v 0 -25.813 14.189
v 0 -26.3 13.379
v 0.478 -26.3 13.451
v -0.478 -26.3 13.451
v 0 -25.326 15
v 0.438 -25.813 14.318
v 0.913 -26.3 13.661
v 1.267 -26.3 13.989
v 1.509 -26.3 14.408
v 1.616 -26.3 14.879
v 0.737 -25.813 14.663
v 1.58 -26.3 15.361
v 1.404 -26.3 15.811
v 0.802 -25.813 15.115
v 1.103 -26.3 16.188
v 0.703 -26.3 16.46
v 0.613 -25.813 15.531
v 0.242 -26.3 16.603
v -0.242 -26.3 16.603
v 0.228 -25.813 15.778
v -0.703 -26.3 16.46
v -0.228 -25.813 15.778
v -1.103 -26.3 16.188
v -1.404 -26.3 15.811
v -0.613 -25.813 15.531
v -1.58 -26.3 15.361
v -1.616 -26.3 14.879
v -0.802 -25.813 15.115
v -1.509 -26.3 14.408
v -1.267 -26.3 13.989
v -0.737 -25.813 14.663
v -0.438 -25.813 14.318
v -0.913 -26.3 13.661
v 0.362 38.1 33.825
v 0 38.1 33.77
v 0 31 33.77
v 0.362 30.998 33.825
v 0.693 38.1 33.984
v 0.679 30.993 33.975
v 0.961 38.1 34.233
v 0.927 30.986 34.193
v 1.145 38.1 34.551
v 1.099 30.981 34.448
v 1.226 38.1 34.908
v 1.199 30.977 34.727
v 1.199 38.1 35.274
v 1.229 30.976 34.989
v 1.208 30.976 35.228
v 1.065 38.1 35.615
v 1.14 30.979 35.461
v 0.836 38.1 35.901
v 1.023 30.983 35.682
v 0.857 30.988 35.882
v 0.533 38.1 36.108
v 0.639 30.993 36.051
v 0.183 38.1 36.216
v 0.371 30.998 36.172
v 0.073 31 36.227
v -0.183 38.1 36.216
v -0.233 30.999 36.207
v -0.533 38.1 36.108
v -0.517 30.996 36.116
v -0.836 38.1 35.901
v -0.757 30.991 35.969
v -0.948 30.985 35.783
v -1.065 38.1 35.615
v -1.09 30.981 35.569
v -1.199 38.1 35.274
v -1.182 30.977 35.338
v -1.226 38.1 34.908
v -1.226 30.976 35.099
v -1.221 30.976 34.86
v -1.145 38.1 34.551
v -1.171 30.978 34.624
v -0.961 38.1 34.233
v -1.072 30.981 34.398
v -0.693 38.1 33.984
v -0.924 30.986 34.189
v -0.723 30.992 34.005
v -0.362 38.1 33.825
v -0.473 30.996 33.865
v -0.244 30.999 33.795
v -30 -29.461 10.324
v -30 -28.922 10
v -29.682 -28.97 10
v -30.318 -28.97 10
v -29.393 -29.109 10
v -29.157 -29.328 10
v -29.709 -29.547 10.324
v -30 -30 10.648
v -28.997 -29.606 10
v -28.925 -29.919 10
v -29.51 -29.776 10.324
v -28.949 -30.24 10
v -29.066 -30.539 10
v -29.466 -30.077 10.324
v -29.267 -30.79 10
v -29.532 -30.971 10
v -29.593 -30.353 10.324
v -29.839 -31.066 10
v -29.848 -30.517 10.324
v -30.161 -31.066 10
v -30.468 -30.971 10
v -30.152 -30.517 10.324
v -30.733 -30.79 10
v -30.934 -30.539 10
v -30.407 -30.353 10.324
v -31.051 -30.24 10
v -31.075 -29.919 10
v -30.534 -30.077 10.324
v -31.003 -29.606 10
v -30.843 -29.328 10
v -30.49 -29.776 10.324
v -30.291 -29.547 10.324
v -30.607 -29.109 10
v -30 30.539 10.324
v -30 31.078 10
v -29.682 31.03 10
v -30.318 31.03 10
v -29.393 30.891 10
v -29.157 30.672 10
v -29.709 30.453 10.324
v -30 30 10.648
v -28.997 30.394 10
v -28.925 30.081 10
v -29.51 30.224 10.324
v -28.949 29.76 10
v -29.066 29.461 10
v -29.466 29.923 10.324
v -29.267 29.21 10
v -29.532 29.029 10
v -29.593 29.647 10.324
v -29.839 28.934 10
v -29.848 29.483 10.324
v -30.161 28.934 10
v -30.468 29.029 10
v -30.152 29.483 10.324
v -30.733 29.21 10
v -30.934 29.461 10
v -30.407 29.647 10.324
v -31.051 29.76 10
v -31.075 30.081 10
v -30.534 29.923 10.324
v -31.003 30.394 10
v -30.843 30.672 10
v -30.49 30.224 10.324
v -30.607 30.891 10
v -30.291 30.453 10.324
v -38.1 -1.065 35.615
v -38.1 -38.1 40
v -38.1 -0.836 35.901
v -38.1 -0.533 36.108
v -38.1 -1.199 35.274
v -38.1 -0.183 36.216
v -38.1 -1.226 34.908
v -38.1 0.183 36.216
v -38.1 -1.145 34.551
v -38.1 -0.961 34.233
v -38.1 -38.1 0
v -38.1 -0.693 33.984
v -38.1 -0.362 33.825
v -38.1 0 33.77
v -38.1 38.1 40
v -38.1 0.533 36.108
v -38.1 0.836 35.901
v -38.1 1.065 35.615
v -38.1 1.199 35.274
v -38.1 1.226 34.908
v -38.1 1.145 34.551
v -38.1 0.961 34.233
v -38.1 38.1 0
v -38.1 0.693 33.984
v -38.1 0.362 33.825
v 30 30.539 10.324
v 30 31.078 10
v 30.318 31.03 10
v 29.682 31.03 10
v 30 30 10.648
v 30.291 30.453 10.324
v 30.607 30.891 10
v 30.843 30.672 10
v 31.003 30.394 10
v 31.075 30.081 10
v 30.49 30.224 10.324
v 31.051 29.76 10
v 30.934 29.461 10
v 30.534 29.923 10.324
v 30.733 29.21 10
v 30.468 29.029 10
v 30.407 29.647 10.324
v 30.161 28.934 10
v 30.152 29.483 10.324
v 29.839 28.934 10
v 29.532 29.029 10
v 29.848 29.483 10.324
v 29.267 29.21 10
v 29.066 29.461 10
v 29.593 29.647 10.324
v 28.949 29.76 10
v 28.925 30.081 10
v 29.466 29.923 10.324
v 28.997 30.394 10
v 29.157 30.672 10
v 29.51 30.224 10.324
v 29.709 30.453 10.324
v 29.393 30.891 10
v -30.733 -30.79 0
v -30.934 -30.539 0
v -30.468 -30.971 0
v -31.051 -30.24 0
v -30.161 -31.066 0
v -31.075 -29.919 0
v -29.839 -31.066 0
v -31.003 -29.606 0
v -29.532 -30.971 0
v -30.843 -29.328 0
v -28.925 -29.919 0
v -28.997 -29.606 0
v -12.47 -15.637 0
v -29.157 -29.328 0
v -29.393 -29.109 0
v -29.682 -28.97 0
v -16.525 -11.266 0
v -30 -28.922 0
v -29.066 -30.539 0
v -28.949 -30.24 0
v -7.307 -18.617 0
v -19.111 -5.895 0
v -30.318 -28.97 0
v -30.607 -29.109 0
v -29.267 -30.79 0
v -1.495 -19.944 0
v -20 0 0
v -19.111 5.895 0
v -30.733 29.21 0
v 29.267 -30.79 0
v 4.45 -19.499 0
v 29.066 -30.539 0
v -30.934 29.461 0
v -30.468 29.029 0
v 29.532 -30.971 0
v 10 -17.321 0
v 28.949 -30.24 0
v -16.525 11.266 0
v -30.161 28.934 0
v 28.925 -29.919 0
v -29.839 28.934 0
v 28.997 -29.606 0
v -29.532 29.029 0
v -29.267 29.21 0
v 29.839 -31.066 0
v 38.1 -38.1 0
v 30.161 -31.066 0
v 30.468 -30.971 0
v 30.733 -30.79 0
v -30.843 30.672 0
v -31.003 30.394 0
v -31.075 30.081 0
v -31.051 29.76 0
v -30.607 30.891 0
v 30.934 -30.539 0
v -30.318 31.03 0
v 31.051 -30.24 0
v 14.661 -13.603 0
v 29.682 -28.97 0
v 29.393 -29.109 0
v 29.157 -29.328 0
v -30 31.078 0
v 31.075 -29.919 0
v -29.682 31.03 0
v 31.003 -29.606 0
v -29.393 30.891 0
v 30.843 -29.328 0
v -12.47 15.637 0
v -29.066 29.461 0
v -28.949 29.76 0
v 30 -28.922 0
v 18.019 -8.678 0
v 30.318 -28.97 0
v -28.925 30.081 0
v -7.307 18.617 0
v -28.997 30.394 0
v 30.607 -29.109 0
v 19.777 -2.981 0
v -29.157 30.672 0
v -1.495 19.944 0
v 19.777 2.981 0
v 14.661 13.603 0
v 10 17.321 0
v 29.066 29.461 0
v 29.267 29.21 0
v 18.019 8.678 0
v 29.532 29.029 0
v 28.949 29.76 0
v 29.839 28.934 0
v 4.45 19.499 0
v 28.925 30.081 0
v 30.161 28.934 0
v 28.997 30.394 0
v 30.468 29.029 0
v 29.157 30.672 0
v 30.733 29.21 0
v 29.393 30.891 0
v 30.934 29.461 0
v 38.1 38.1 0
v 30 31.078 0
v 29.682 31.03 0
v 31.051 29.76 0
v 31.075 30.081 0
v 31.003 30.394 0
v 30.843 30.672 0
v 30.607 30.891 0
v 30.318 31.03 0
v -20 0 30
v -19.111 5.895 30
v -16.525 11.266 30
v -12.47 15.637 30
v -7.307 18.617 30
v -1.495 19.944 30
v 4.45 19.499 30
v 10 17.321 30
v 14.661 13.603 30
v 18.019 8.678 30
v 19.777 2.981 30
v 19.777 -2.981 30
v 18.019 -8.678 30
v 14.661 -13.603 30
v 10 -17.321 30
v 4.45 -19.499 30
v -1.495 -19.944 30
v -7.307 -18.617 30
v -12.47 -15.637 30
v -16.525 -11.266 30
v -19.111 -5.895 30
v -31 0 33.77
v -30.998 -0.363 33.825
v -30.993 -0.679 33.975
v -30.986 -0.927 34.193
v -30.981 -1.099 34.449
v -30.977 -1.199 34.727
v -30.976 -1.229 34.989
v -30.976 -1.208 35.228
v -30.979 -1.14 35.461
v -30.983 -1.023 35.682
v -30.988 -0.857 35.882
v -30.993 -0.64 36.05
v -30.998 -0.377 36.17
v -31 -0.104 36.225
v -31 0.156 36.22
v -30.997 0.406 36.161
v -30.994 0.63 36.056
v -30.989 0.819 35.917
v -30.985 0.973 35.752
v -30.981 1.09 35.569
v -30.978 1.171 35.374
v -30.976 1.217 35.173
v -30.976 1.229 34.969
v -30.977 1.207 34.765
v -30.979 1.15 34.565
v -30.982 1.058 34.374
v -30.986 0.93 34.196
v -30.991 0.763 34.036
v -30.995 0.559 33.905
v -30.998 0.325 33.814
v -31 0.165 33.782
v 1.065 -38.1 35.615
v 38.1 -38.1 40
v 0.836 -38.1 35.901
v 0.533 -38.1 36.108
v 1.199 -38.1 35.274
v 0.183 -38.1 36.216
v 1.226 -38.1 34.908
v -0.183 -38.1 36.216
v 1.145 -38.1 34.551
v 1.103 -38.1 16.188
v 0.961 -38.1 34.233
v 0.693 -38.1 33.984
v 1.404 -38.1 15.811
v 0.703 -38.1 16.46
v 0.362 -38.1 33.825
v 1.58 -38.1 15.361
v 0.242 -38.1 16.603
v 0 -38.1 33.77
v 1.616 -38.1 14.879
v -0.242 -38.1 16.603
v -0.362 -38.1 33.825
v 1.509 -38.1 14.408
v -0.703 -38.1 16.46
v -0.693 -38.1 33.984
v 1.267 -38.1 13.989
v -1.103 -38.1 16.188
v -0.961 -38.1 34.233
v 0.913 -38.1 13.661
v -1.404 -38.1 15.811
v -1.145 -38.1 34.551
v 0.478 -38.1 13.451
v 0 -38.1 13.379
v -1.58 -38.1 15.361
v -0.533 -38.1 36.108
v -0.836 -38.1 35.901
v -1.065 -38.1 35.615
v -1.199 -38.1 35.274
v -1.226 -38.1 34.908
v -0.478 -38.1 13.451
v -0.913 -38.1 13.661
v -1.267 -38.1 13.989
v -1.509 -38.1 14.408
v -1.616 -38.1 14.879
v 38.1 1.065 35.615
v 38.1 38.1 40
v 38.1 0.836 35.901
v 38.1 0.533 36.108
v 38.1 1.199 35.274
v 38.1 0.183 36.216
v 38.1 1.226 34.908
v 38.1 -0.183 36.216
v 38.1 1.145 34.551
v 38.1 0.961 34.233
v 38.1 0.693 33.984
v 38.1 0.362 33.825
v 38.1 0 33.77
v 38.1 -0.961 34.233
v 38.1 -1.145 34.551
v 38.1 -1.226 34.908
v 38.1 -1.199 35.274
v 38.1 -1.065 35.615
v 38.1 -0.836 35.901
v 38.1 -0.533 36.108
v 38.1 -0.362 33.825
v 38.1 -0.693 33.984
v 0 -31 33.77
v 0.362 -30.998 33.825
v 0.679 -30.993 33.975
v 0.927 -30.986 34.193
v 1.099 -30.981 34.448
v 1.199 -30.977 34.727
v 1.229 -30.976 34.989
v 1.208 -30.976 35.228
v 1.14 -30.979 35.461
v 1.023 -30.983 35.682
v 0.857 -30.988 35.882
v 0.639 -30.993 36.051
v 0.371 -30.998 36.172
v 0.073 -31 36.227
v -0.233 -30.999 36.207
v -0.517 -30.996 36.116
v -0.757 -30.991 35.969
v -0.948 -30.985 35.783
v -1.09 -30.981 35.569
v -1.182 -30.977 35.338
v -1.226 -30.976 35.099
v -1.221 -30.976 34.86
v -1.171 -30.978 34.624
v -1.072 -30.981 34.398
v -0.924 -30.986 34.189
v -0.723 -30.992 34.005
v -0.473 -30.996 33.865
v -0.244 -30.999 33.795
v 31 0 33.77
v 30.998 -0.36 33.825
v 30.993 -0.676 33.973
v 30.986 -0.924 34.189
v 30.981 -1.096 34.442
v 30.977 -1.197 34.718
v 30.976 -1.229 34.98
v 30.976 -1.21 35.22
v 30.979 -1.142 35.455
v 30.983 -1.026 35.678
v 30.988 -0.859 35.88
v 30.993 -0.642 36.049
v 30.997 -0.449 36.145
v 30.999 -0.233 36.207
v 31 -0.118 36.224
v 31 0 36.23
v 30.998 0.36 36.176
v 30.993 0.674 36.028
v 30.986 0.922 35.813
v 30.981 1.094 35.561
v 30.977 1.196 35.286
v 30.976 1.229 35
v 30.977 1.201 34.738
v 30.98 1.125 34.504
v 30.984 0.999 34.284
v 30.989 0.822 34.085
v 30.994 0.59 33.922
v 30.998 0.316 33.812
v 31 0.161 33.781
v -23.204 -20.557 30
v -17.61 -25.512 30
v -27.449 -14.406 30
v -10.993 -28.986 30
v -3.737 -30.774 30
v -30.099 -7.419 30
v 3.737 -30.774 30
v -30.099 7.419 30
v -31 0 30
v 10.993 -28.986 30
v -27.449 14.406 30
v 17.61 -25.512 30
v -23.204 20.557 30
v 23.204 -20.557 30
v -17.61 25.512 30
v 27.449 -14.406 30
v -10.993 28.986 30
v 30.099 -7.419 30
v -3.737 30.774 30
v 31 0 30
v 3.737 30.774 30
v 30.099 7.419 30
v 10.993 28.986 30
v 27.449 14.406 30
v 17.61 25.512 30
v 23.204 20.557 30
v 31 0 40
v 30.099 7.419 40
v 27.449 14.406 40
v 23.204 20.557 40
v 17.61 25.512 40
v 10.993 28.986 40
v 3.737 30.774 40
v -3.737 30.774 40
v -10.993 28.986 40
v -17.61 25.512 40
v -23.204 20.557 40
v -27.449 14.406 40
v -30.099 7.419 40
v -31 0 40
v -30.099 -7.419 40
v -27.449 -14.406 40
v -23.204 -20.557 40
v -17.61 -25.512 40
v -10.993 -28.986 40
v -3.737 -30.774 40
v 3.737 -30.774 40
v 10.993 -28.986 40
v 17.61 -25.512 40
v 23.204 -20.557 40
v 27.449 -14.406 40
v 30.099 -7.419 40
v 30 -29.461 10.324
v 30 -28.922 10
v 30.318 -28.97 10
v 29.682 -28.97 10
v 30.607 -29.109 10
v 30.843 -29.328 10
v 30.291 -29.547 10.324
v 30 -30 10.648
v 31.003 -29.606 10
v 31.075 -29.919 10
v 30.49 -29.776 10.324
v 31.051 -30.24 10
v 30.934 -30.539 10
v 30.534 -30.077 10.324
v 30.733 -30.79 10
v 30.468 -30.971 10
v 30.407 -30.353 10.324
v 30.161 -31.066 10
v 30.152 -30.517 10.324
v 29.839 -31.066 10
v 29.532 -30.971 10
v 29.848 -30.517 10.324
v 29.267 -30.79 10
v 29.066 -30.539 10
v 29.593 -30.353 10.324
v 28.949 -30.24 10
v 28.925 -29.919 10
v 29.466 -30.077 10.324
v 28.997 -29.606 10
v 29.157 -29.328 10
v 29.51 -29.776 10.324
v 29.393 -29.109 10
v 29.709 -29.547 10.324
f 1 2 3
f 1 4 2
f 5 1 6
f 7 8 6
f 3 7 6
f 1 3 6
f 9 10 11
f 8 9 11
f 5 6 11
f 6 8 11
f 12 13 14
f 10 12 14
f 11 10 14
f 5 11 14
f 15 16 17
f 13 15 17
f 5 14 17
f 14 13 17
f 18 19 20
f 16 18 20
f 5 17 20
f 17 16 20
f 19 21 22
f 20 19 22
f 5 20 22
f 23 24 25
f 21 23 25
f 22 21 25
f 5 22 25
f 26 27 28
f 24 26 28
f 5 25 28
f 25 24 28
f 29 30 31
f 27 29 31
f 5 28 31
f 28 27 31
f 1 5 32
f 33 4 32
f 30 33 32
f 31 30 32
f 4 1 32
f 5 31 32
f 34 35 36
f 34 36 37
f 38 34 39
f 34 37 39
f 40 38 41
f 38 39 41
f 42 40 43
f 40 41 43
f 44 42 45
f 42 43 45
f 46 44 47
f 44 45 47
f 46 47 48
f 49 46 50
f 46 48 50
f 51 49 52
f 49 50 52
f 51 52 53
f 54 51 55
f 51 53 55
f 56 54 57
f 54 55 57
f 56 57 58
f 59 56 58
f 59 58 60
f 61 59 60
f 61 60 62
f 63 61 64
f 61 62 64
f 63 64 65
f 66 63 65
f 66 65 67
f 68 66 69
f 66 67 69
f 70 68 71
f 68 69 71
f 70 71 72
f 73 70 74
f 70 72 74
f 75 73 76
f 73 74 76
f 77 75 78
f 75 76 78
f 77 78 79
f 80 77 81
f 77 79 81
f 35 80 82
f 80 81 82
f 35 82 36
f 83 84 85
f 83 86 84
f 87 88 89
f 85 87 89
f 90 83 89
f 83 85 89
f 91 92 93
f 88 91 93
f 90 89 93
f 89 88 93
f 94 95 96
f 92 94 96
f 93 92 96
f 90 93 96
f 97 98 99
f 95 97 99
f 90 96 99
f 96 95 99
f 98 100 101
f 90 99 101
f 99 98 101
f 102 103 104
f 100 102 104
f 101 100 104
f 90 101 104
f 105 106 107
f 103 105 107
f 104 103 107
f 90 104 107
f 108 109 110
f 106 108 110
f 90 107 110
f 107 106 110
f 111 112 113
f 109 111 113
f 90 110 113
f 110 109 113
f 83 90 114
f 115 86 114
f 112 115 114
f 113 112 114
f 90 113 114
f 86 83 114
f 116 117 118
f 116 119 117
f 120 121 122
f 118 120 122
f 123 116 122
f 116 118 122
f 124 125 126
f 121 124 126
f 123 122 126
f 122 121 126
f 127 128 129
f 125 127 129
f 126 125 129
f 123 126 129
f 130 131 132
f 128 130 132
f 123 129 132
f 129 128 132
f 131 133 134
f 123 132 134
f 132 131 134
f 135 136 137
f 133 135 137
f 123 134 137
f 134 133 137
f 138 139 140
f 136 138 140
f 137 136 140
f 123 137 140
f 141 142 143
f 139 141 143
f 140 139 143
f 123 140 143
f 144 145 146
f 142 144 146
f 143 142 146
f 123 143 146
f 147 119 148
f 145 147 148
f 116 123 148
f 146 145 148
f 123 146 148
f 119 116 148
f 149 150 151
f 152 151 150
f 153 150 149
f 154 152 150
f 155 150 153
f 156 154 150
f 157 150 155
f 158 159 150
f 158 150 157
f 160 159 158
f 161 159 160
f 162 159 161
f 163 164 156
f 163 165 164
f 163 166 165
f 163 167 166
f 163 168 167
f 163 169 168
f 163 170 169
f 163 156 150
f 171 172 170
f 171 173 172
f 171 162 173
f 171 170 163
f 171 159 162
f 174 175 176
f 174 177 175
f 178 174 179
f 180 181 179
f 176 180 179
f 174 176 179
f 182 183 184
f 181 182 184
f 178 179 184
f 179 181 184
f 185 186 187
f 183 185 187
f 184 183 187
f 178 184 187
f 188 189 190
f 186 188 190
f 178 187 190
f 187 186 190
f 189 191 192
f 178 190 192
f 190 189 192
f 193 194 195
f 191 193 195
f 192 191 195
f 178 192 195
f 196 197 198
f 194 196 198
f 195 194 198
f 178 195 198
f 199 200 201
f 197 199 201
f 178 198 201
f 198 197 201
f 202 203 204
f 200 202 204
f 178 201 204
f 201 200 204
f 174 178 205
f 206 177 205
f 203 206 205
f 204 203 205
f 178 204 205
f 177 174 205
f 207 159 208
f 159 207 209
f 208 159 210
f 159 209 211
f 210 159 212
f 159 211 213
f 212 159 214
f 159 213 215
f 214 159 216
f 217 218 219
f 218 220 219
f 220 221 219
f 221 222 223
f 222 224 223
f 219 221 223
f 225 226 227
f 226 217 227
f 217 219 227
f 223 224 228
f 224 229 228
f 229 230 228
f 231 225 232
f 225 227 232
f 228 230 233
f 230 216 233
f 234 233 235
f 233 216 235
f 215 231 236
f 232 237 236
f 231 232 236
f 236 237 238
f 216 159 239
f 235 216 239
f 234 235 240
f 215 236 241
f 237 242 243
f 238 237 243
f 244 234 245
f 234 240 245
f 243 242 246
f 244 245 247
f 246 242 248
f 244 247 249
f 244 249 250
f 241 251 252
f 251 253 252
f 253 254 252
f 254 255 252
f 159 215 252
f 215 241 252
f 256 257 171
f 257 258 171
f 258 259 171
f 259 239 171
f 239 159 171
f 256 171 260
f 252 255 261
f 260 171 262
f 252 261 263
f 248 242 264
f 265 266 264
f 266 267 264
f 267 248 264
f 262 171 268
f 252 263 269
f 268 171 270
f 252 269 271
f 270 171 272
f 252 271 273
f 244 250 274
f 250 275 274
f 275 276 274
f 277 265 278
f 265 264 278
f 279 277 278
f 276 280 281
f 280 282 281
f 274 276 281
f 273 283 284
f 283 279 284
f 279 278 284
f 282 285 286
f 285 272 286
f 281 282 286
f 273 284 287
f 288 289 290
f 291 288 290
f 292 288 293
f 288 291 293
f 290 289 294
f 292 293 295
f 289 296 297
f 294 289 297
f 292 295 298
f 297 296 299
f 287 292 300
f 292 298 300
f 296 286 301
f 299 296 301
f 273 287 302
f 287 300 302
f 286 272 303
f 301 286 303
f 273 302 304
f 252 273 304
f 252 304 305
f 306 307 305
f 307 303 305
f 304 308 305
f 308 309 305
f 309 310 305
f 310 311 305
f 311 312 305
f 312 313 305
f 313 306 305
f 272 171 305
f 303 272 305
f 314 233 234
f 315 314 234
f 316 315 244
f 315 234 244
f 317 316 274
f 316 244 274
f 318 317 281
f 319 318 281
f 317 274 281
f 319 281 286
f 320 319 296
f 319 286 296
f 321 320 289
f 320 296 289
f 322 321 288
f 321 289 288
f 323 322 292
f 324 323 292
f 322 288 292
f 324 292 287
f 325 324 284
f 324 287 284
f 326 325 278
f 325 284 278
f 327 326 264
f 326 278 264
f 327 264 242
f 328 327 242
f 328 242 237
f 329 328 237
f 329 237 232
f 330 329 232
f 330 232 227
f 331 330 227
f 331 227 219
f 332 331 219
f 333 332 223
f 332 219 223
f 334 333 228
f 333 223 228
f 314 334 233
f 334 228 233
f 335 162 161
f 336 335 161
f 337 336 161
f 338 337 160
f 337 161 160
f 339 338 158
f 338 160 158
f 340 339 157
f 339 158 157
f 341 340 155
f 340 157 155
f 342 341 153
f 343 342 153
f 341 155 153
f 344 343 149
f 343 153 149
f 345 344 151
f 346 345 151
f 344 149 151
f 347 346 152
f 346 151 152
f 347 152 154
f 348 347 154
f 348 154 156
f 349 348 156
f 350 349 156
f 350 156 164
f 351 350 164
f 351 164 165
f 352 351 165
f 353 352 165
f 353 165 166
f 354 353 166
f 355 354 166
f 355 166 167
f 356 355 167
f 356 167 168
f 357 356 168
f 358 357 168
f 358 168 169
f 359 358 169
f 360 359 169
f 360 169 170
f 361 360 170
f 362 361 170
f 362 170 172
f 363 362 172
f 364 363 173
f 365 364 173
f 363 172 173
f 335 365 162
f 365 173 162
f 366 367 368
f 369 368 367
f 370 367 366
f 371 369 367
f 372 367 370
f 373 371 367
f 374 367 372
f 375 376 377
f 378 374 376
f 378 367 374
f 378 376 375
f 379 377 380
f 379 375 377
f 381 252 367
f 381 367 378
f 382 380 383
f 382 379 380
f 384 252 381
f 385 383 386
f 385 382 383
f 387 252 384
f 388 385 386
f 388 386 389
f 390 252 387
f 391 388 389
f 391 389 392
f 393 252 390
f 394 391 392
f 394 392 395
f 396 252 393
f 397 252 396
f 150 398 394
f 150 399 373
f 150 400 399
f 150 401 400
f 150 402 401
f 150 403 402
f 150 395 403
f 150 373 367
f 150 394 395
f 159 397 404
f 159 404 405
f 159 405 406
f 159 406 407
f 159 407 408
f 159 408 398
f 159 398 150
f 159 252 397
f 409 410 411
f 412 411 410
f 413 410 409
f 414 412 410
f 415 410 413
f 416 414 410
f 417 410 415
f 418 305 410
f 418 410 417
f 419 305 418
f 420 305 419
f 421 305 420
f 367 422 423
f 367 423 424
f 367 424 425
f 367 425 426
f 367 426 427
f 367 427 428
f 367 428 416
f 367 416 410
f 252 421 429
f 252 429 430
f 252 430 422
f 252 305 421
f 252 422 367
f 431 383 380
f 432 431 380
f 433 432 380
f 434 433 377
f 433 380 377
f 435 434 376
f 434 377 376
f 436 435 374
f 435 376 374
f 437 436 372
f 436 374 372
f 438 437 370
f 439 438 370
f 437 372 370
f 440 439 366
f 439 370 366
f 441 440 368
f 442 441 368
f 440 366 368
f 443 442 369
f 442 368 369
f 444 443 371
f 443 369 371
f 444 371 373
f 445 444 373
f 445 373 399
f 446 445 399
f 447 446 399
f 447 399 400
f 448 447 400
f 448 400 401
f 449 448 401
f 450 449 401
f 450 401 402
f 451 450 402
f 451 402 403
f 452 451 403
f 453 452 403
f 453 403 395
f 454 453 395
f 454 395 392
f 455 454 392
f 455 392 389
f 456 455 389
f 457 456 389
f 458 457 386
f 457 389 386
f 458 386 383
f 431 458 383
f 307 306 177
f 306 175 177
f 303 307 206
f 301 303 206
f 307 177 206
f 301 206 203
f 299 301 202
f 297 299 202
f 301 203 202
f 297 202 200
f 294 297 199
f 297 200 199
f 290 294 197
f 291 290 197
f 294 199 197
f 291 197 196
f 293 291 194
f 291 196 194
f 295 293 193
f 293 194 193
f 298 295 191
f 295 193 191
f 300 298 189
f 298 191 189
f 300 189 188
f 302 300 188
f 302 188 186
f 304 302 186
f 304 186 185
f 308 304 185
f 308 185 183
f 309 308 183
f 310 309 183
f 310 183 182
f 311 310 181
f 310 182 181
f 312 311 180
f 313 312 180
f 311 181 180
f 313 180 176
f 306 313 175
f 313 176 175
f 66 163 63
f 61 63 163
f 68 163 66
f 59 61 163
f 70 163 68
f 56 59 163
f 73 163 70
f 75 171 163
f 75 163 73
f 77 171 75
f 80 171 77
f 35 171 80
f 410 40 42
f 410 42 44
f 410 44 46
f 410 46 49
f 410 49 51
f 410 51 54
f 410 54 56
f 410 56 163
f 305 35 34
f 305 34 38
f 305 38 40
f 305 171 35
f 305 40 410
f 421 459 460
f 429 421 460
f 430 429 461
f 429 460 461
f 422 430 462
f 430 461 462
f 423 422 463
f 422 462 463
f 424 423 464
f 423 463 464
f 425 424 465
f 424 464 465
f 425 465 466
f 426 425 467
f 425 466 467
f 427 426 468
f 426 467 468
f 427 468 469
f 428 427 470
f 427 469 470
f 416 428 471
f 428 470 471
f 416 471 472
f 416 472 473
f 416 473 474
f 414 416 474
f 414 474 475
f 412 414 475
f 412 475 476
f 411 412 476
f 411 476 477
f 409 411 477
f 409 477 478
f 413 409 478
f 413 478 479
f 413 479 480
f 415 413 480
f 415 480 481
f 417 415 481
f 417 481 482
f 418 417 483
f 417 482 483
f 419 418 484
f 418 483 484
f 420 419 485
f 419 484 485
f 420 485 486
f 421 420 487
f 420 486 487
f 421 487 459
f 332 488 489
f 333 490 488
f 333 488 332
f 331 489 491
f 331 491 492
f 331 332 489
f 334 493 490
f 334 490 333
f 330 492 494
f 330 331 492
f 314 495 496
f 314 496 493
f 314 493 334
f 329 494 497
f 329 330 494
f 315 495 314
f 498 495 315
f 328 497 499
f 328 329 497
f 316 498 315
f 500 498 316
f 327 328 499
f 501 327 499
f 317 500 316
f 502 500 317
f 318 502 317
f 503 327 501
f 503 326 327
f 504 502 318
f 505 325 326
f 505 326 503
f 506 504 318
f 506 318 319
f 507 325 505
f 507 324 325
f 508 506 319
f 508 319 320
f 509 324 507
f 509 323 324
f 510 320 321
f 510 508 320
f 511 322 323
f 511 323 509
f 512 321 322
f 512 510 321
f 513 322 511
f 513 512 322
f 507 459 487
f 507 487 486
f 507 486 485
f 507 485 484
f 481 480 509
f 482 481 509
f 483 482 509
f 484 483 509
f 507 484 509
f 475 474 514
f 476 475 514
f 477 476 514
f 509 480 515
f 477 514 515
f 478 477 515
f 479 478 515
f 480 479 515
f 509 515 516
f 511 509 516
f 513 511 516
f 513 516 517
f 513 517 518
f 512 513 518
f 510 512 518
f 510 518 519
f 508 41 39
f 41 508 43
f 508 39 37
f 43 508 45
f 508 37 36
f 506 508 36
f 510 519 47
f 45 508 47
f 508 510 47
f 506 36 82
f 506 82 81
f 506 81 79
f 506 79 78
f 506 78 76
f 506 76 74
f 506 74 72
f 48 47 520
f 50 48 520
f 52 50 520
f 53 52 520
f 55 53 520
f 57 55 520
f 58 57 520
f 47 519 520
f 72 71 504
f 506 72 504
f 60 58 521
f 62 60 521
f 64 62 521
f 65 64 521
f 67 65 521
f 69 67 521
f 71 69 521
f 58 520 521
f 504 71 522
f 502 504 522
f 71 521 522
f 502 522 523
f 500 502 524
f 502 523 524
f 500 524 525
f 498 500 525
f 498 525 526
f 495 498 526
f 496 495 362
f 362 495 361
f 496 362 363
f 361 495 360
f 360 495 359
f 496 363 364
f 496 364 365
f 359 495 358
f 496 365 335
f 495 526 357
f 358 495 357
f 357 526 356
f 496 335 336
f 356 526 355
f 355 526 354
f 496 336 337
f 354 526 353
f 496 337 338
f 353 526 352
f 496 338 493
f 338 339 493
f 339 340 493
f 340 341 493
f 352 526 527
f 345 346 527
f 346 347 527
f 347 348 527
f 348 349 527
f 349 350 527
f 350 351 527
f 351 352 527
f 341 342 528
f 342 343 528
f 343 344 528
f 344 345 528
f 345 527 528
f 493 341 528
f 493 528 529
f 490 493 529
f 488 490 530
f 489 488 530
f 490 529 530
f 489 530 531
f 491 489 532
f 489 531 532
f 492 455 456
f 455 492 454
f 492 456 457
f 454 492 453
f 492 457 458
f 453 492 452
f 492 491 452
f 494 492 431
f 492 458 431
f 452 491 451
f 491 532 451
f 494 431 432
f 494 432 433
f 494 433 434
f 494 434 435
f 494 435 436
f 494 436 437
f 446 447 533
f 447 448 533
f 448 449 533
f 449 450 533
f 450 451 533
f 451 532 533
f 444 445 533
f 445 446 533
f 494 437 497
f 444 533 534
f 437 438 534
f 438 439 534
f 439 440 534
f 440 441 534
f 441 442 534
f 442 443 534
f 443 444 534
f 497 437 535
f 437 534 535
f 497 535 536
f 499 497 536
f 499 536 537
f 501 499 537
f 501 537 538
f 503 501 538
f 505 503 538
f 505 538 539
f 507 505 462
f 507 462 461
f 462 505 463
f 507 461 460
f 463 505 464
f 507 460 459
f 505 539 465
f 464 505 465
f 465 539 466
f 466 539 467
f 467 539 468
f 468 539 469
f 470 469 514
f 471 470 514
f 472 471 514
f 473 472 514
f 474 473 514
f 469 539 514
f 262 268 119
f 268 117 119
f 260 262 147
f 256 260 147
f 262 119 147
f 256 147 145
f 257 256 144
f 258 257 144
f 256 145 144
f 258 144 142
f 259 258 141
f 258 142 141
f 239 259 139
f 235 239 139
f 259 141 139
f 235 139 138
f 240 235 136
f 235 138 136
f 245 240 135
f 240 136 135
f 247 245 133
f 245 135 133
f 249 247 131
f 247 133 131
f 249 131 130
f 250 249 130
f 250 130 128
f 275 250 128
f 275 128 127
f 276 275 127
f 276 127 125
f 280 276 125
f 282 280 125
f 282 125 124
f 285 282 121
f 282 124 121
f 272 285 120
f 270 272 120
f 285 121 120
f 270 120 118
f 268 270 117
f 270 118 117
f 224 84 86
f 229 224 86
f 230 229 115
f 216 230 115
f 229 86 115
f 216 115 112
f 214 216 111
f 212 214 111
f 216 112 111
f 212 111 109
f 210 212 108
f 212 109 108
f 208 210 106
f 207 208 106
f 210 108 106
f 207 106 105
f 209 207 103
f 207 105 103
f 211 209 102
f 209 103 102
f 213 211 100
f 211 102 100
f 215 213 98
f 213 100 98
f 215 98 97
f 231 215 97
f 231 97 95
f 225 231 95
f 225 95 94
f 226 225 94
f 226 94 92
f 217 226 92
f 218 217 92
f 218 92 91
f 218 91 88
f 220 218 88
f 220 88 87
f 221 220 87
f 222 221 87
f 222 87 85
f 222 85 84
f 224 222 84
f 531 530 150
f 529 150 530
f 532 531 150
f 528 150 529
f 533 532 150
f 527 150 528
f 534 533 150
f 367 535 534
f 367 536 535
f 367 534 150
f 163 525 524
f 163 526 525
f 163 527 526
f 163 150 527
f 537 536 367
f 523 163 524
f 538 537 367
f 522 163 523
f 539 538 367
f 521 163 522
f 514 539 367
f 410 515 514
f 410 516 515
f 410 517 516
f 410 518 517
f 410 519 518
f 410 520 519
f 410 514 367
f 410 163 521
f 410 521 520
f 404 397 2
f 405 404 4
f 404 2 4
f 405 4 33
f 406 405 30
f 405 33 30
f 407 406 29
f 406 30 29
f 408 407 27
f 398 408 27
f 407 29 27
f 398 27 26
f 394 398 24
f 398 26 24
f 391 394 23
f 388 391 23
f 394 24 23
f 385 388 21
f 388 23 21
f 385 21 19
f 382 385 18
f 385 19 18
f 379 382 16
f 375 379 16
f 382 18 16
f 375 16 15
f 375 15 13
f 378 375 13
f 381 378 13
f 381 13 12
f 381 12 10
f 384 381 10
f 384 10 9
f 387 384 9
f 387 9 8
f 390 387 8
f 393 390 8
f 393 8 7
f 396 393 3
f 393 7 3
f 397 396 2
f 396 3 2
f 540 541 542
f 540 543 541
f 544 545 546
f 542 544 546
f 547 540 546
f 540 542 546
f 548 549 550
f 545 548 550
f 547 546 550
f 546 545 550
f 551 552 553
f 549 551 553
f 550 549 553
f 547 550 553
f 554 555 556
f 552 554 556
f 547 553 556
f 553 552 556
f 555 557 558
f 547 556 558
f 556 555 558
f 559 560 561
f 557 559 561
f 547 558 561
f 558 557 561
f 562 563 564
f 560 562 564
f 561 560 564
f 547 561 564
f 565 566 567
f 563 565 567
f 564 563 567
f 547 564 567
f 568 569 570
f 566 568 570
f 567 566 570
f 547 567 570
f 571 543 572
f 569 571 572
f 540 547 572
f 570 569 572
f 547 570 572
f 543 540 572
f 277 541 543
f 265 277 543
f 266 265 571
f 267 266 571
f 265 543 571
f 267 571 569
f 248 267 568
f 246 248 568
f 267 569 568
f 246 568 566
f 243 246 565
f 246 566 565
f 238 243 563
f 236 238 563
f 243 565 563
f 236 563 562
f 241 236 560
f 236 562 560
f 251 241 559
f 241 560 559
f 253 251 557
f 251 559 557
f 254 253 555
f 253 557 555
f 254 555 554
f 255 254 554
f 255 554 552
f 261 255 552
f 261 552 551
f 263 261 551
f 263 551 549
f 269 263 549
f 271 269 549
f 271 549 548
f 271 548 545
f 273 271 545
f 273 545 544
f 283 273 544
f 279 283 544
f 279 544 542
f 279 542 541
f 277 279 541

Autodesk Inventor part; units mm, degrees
ref_plane "YZ Plane" through (0, 0, 0) normal (1, 0, 0) x (0, 1, 0)
ref_plane "XZ Plane" through (0, 0, 0) normal (0, 1, 0) x (-1, 0, 0)
ref_plane "XY Plane" through (0, 0, 0) normal (0, 0, 1) x (1, 0, 0)
sketch "Sketch1" plane through (0, 0, 0) normal (0, 0, 1) x (1, 0, 0)
  line L0 (-38.1, 38.1) -> (38.1, 38.1)
  line L1 (38.1, 38.1) -> (38.1, -38.1)
  line L2 (38.1, -38.1) -> (-38.1, -38.1)
  line L3 (-38.1, -38.1) -> (-38.1, 38.1)
  point P0 (0, 0)
  dimension "d0" = 76.2
  dimension "d1" = 76.2
  dimension "d2" = 38.1
  dimension "d3" = 38.1
extrude "baseExtrusion" add sketch "Sketch1" along normal blind 40
sketch "Sketch2" plane through (0, 0, 40) normal (0, 0, 1) x (1, 0, 0)
  circle A0 centre (0, 0) radius 31
  dimension "d6" = 62
extrude "tlExtrusion" cut sketch "Sketch2" against normal blind 10
sketch "Sketch3" plane through (0, 0, 0) normal (0, 0, -1) x (-1, 0, 0)
  circle A0 centre (0, 0) radius 20
  dimension "d9" = 40
extrude "lightPathExtrusion" cut sketch "Sketch3" against normal through all
sketch "Sketch4" plane through (38.1, -38.1, 0) normal (1, 0, 0) x (0, 0, -1)
  line L0 (0, 76.2) -> (0, 0) projected
  line L1 (-40, 0) -> (-40, 76.2) projected
  point P0 (0, 38.1)
  point P1 (-35, 38.1)
  point P2 (0, 38.1)
  dimension "d12" = 5
hole "tubeLensGrubScrew1" at (38.1, 0, 35) direction (-1, 0, 0) diameter 2.459 end through all thread size "M3x0.5" class "6H" standard "ISO Metric profile"
pattern_circular "tubeLensGrubScrew2" count 2 over 90 about axis through (0, 0, -10) along (0, 0, 1) of "tubeLensGrubScrew1"
sketch "Sketch5" plane through (0, 0, 0) normal (0, 0, -1) x (-1, 0, 0)
  point P0 (0, 0)
  point P1 (-30, -30)
  point P2 (-30, 30)
  point P3 (30, -30)
  point P4 (30, 30)
  dimension "d23" = 60
  dimension "d24" = 60
  dimension "d25" = 30
  dimension "d26" = 30
hole "60mmCageSystem" at (30, -30, 0) at (30, 30, 0) at (-30, -30, 0) at (-30, 30, 0) direction (0, 0, 1) diameter 2.156 depth 10 tip angle 118 thread size "4-40 UNC" class "2B" standard "ANSI Unified Screw Threads"
sketch "Sketch6" plane through (-38.1, -38.1, 0) normal (0, -1, 0) x (1, 0, 0)
  line L0 (76.2, 0) -> (0, 0) projected
  point P0 (38.1, 0)
  point P1 (38.1, 15)
  point P2 (38.1, 0)
  dimension "d34" = 15
hole "m6MountingHole" at (0, -38.1, 15) direction (0, 1, 0) diameter 3.242 depth 11.8 tip angle 118 thread size "M4x0.7" class "6H" standard "ISO Metric profile"
equation "\"d2\" = 0.5 * d1"
equation "\"d3\" = 0.5 * d0"
equation "\"d25\" = 0.5 * d23"
equation "\"d26\" = 0.5 * d24"
properties part number "tubeLensHolder_v5"
